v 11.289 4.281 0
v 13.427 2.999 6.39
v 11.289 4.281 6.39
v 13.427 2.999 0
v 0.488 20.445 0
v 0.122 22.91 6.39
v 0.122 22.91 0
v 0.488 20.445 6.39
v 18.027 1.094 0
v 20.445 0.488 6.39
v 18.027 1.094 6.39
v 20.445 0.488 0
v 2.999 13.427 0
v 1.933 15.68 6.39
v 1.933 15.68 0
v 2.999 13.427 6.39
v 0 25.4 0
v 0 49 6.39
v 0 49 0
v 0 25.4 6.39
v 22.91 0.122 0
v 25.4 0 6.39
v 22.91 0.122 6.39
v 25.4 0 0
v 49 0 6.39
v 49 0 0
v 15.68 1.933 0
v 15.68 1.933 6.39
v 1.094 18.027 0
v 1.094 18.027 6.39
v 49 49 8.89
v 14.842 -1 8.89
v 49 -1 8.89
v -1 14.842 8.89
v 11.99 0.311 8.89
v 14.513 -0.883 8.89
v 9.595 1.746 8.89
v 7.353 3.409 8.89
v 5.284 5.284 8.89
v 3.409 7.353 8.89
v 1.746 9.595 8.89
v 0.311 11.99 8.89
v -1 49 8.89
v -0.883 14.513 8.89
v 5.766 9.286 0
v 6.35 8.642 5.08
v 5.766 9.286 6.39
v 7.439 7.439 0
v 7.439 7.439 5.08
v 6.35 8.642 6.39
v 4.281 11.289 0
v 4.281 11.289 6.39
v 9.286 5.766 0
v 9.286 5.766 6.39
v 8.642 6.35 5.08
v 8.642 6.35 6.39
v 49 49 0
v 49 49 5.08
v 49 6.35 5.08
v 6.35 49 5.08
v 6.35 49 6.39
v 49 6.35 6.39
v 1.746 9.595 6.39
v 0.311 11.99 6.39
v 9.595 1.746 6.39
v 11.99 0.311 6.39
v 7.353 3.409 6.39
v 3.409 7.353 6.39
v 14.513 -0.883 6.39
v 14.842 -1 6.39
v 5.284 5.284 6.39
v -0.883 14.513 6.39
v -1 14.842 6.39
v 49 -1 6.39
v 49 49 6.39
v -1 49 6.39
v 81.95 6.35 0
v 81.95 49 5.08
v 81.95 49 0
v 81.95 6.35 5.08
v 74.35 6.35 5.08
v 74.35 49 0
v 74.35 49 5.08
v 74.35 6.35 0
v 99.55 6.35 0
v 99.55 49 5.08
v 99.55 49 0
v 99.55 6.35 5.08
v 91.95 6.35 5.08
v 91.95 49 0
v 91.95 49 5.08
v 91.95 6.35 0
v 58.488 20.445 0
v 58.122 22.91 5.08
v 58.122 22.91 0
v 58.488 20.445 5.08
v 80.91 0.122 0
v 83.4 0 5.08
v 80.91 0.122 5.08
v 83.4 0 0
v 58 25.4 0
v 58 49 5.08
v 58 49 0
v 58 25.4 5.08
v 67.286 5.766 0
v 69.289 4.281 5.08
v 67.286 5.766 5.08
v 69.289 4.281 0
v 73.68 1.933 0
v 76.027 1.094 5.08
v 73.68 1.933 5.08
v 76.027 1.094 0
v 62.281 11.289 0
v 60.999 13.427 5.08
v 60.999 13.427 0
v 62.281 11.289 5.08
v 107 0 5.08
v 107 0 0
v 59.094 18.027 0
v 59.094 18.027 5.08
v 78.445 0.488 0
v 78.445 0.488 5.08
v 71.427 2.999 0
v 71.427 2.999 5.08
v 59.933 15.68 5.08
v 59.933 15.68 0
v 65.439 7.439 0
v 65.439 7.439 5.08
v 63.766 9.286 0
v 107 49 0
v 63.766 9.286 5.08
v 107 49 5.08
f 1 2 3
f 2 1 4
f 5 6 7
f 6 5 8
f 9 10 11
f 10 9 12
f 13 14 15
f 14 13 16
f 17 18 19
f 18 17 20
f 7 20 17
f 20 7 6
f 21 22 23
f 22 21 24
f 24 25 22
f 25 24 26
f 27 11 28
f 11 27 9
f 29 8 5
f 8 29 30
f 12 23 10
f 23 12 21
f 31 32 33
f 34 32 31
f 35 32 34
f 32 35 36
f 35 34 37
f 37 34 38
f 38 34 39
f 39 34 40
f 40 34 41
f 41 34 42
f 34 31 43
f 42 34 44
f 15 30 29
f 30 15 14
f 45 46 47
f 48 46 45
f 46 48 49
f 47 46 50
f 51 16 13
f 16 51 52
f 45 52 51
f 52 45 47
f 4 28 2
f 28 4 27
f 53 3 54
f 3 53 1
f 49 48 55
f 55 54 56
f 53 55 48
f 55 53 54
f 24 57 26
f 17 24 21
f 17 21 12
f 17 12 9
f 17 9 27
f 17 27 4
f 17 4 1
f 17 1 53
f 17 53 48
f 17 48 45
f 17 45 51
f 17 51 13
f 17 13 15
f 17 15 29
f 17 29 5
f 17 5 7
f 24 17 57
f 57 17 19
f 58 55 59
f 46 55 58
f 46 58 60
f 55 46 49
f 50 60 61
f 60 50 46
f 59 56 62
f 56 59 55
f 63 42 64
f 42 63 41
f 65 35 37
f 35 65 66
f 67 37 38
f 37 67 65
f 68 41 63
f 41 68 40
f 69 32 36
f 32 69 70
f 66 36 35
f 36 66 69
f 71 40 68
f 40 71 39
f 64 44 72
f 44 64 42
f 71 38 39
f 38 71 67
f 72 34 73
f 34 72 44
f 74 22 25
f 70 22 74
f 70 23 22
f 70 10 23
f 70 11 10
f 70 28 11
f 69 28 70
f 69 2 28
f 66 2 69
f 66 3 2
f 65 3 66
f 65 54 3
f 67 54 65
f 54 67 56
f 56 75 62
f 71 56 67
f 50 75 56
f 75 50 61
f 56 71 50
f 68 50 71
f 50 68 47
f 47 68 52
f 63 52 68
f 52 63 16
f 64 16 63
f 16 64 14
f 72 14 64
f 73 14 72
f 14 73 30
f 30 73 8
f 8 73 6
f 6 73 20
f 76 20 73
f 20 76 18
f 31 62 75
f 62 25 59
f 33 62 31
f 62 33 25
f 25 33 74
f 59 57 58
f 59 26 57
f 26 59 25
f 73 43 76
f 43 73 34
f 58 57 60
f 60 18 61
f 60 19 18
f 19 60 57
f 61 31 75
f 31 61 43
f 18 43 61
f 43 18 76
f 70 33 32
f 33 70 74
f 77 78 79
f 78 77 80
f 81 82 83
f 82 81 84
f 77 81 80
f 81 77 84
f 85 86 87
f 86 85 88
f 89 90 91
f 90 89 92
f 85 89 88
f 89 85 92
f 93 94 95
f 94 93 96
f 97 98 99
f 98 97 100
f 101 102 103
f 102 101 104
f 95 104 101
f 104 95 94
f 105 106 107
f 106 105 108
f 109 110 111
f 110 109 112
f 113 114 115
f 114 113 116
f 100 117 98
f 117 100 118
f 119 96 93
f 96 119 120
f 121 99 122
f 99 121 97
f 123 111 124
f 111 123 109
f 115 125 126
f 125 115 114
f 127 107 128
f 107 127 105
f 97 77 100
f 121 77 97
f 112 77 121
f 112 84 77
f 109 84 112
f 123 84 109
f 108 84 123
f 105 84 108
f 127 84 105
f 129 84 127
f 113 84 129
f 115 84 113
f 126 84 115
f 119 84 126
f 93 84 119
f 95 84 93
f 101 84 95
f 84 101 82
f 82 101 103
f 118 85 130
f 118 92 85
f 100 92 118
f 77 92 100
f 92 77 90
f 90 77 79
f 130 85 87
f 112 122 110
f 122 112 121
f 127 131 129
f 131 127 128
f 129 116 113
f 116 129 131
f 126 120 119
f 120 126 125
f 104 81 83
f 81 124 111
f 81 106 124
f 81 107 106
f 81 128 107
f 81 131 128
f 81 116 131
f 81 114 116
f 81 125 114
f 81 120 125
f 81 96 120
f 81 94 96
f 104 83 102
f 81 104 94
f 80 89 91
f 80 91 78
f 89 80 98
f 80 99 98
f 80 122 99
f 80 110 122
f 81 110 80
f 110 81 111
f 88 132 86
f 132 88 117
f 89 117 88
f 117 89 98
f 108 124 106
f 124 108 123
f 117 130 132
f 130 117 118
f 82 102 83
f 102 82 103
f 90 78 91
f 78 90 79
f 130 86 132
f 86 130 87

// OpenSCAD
// file: model-forge/model-forge/tray.scad
// model-forge/tray.scad — rounded-corner outer panel with a recessed
// inset pocket (e.g. a "cooking dish" recess): a raised rim around the
// edge, floor thickness under the pocket, and an optional thin lip
// flange around the base — sized to slide into a support-rail groove
// (like the wooden rails inside the real Tiny Land oven cavity) rather
// than just resting loose.
//
//   use <model-forge/tray.scad>
//   rounded_tray(outer_width=285.75, outer_height=228.6, corner_radius=25.4,
//                floor_thickness=5.08, rim_height=3.81, inset_margin=6.35,
//                lip_width=3, lip_thickness=2);
//
// Shape: outer_width x outer_height slab, rounded corners (corner_radius),
// total height = floor_thickness + rim_height. A pocket is cut from the
// top, inset_margin in from every edge, cutting down through rim_height
// and stopping at floor_thickness from the bottom — so floor_thickness is
// what's left under the pocket, rim_height is how tall the surrounding
// wall stands above the pocket floor.
//
// The lip (lip_width/lip_thickness) is a thin flange at the TOP of the
// rim (from total_height-lip_thickness to total_height), sticking out
// lip_width beyond the main body on every side — corrected 2026-09-11
// per feedback on the real rail photo: the groove is near the top of the
// cavity wall, not the bottom. Both default to 0 (no lip) so existing
// calls keep working unchanged.

// hull-of-4-circles rounded rect — much faster to render than a
// minkowski-based approach for this shape (no minkowski sum needed).
module rounded_rect_2d(w, h, r) {
  hull() {
    translate([r, r]) circle(r = r, $fn = 64);
    translate([w - r, r]) circle(r = r, $fn = 64);
    translate([r, h - r]) circle(r = r, $fn = 64);
    translate([w - r, h - r]) circle(r = r, $fn = 64);
  }
}

module rounded_tray(
  outer_width,
  outer_height,
  corner_radius,
  floor_thickness,
  rim_height,
  inset_margin,
  lip_width = 0,
  lip_thickness = 0
) {
  total_height = floor_thickness + rim_height;

  union() {
    if (lip_width > 0 && lip_thickness > 0) {
      translate([-lip_width, -lip_width, total_height - lip_thickness])
        linear_extrude(height = lip_thickness)
          rounded_rect_2d(outer_width + 2 * lip_width, outer_height + 2 * lip_width, corner_radius + lip_width);
    }
    difference() {
      linear_extrude(height = total_height)
        rounded_rect_2d(outer_width, outer_height, corner_radius);
      translate([inset_margin, inset_margin, floor_thickness])
        cube([outer_width - 2 * inset_margin, outer_height - 2 * inset_margin, rim_height + 1]);
    }
  }
}
// file: model-forge/grate.scad
// model-forge/grate.scad — rounded-corner panel cut into an oven-rack-
// style bar grate: a solid frame border, parallel bars across the
// interior with open gaps between them.
//
//   use <model-forge/grate.scad>
//   oven_grate(outer_width=285.75, outer_height=228.6, corner_radius=25.4,
//              thickness=5.08, frame_width=6.35, bar_width=10, gap_width=7.6);
//
// Bars run parallel to the height (vertical bars spanning the width),
// starting and ending with a solid bar against the frame — real oven
// racks don't have a gap right at the edge. Spacing is pitch-based
// (bar_width + gap_width repeating); it won't divide the interior
// perfectly evenly on every size, so the last bar absorbs any leftover
// width. Tune bar_width/gap_width and re-render if that's visible.
use <model-forge/tray.scad> // rounded_rect_2d

module oven_grate(outer_width, outer_height, corner_radius, thickness, frame_width, bar_width, gap_width) {
  inner_width = outer_width - 2 * frame_width;
  inner_height = outer_height - 2 * frame_width;
  pitch = bar_width + gap_width;
  n_gaps = floor((inner_width - bar_width) / pitch);

  difference() {
    linear_extrude(height = thickness)
      rounded_rect_2d(outer_width, outer_height, corner_radius);
    for (i = [0 : n_gaps - 1]) {
      x = frame_width + bar_width + i * pitch;
      translate([x, frame_width, -1])
        cube([gap_width, inner_height, thickness + 2]);
    }
  }
}
// file: model-forge/tray.scad
// model-forge/tray.scad — rounded-corner outer panel with a recessed
// inset pocket (e.g. a "cooking dish" recess): a raised rim around the
// edge, floor thickness under the pocket, and an optional thin lip
// flange around the base — sized to slide into a support-rail groove
// (like the wooden rails inside the real Tiny Land oven cavity) rather
// than just resting loose.
//
//   use <model-forge/tray.scad>
//   rounded_tray(outer_width=285.75, outer_height=228.6, corner_radius=25.4,
//                floor_thickness=5.08, rim_height=3.81, inset_margin=6.35,
//                lip_width=3, lip_thickness=2);
//
// Shape: outer_width x outer_height slab, rounded corners (corner_radius),
// total height = floor_thickness + rim_height. A pocket is cut from the
// top, inset_margin in from every edge, cutting down through rim_height
// and stopping at floor_thickness from the bottom — so floor_thickness is
// what's left under the pocket, rim_height is how tall the surrounding
// wall stands above the pocket floor.
//
// The lip (lip_width/lip_thickness) is a thin flange at the TOP of the
// rim (from total_height-lip_thickness to total_height), sticking out
// lip_width beyond the main body on every side — corrected 2026-09-11
// per feedback on the real rail photo: the groove is near the top of the
// cavity wall, not the bottom. Both default to 0 (no lip) so existing
// calls keep working unchanged.

// hull-of-4-circles rounded rect — much faster to render than a
// minkowski-based approach for this shape (no minkowski sum needed).
module rounded_rect_2d(w, h, r) {
  hull() {
    translate([r, r]) circle(r = r, $fn = 64);
    translate([w - r, r]) circle(r = r, $fn = 64);
    translate([r, h - r]) circle(r = r, $fn = 64);
    translate([w - r, h - r]) circle(r = r, $fn = 64);
  }
}

module rounded_tray(
  outer_width,
  outer_height,
  corner_radius,
  floor_thickness,
  rim_height,
  inset_margin,
  lip_width = 0,
  lip_thickness = 0
) {
  total_height = floor_thickness + rim_height;

  union() {
    if (lip_width > 0 && lip_thickness > 0) {
      translate([-lip_width, -lip_width, total_height - lip_thickness])
        linear_extrude(height = lip_thickness)
          rounded_rect_2d(outer_width + 2 * lip_width, outer_height + 2 * lip_width, corner_radius + lip_width);
    }
    difference() {
      linear_extrude(height = total_height)
        rounded_rect_2d(outer_width, outer_height, corner_radius);
      translate([inset_margin, inset_margin, floor_thickness])
        cube([outer_width - 2 * inset_margin, outer_height - 2 * inset_margin, rim_height + 1]);
    }
  }
}
// main file
// Tiny Land oven insert — lip fit-test coupons. Small, fast-printing
// crops taken directly out of the REAL tray/grate geometry (not a
// separately-modeled approximation) via intersection() with a small box,
// so what you test-fit against the oven cavity's support rail is exactly
// the lip that will ship on the full parts. Two coupons print at once:
// one corner of the tray, one corner of the grate — a corner crop shows
// BOTH lip_width (long edge) and end_lip_width (short edge) in a single
// piece, joined by the rounded corner.
//
// Corner, not a straight edge: an edge-middle crop of the grate falls
// apart into loose disconnected bar fragments (verified via trimesh —
// only the frame's un-gapped border band along each edge actually ties
// the bars together, and a straight-edge-middle crop misses the
// perpendicular band). A corner crop always includes both perimeter
// frame bands, so it stays one connected, printable piece.
//
// Print this, press it into the real rail groove, confirm lip_thickness_mm
// fits (<=3mm), then dial in oven-tray.scad / oven-grate.scad and iterate.
use <model-forge/tray.scad>
use <model-forge/grate.scad>

/* [Full-part dimensions — keep in sync with oven-tray.scad / oven-grate.scad] */
outer_width_in  = 11.25;
outer_height_in = 9;
corner_radius_in = 1;

/* [Tray pocket] */
floor_thickness_mm = 5.08;
rim_height_mm       = 3.81;
inset_margin_mm      = 6.35;

/* [Grate bars] */
grate_thickness_mm   = 5.08;
frame_width_mm       = 6.35;
bar_width_mm         = 10;
gap_width_mm         = 7.6;

/* [Lip — slides into the oven cavity's support-rail groove] */
lip_width_in     = 0.12; // [0:0.01:1]  long (top/bottom) edges
end_lip_width_in = 0.5;  // [0:0.01:1]  short (left/right) edges
lip_thickness_mm = 2.5;  // [0.5:0.1:3]  must be <=3mm to fit the real rail; 2.5mm is the sweet spot

/* [Coupon] */
coupon_size_mm = 50; // [20:5:100]  edge length of each cropped square test piece
coupon_gap_mm  = 8;  // [2:1:30]    spacing between the 2 coupons on the plate

IN_TO_MM = 25.4;
outer_w = outer_width_in * IN_TO_MM;
outer_h = outer_height_in * IN_TO_MM;
CROP_TALL = 100; // taller than any real part height — just needs to fully cover it

module full_tray() {
  rounded_tray(
    outer_width     = outer_w,
    outer_height    = outer_h,
    corner_radius   = corner_radius_in * IN_TO_MM,
    floor_thickness = floor_thickness_mm,
    rim_height      = rim_height_mm,
    inset_margin    = inset_margin_mm,
    lip_width       = lip_width_in * IN_TO_MM,
    end_lip_width   = end_lip_width_in * IN_TO_MM,
    lip_thickness   = lip_thickness_mm
  );
}

module full_grate() {
  oven_grate(
    outer_width   = outer_w,
    outer_height  = outer_h,
    corner_radius = corner_radius_in * IN_TO_MM,
    thickness     = grate_thickness_mm,
    frame_width   = frame_width_mm,
    bar_width     = bar_width_mm,
    gap_width     = gap_width_mm,
    lip_width     = lip_width_in * IN_TO_MM,
    end_lip_width = end_lip_width_in * IN_TO_MM,
    lip_thickness = lip_thickness_mm
  );
}

// Crop a coupon_size x coupon_size square out of the bottom-left corner
// (X=0 short edge meets Y=0 long edge) — shows both lip_width and
// end_lip_width, joined by the rounded corner, as one connected piece.
module corner_crop() {
  intersection() {
    children(0);
    translate([-1, -1, -1])
      cube([coupon_size_mm, coupon_size_mm, CROP_TALL]);
  }
}

step = coupon_size_mm + coupon_gap_mm;

translate([0, 0, 0])    corner_crop() full_tray();
translate([step, 0, 0]) corner_crop() full_grate();
